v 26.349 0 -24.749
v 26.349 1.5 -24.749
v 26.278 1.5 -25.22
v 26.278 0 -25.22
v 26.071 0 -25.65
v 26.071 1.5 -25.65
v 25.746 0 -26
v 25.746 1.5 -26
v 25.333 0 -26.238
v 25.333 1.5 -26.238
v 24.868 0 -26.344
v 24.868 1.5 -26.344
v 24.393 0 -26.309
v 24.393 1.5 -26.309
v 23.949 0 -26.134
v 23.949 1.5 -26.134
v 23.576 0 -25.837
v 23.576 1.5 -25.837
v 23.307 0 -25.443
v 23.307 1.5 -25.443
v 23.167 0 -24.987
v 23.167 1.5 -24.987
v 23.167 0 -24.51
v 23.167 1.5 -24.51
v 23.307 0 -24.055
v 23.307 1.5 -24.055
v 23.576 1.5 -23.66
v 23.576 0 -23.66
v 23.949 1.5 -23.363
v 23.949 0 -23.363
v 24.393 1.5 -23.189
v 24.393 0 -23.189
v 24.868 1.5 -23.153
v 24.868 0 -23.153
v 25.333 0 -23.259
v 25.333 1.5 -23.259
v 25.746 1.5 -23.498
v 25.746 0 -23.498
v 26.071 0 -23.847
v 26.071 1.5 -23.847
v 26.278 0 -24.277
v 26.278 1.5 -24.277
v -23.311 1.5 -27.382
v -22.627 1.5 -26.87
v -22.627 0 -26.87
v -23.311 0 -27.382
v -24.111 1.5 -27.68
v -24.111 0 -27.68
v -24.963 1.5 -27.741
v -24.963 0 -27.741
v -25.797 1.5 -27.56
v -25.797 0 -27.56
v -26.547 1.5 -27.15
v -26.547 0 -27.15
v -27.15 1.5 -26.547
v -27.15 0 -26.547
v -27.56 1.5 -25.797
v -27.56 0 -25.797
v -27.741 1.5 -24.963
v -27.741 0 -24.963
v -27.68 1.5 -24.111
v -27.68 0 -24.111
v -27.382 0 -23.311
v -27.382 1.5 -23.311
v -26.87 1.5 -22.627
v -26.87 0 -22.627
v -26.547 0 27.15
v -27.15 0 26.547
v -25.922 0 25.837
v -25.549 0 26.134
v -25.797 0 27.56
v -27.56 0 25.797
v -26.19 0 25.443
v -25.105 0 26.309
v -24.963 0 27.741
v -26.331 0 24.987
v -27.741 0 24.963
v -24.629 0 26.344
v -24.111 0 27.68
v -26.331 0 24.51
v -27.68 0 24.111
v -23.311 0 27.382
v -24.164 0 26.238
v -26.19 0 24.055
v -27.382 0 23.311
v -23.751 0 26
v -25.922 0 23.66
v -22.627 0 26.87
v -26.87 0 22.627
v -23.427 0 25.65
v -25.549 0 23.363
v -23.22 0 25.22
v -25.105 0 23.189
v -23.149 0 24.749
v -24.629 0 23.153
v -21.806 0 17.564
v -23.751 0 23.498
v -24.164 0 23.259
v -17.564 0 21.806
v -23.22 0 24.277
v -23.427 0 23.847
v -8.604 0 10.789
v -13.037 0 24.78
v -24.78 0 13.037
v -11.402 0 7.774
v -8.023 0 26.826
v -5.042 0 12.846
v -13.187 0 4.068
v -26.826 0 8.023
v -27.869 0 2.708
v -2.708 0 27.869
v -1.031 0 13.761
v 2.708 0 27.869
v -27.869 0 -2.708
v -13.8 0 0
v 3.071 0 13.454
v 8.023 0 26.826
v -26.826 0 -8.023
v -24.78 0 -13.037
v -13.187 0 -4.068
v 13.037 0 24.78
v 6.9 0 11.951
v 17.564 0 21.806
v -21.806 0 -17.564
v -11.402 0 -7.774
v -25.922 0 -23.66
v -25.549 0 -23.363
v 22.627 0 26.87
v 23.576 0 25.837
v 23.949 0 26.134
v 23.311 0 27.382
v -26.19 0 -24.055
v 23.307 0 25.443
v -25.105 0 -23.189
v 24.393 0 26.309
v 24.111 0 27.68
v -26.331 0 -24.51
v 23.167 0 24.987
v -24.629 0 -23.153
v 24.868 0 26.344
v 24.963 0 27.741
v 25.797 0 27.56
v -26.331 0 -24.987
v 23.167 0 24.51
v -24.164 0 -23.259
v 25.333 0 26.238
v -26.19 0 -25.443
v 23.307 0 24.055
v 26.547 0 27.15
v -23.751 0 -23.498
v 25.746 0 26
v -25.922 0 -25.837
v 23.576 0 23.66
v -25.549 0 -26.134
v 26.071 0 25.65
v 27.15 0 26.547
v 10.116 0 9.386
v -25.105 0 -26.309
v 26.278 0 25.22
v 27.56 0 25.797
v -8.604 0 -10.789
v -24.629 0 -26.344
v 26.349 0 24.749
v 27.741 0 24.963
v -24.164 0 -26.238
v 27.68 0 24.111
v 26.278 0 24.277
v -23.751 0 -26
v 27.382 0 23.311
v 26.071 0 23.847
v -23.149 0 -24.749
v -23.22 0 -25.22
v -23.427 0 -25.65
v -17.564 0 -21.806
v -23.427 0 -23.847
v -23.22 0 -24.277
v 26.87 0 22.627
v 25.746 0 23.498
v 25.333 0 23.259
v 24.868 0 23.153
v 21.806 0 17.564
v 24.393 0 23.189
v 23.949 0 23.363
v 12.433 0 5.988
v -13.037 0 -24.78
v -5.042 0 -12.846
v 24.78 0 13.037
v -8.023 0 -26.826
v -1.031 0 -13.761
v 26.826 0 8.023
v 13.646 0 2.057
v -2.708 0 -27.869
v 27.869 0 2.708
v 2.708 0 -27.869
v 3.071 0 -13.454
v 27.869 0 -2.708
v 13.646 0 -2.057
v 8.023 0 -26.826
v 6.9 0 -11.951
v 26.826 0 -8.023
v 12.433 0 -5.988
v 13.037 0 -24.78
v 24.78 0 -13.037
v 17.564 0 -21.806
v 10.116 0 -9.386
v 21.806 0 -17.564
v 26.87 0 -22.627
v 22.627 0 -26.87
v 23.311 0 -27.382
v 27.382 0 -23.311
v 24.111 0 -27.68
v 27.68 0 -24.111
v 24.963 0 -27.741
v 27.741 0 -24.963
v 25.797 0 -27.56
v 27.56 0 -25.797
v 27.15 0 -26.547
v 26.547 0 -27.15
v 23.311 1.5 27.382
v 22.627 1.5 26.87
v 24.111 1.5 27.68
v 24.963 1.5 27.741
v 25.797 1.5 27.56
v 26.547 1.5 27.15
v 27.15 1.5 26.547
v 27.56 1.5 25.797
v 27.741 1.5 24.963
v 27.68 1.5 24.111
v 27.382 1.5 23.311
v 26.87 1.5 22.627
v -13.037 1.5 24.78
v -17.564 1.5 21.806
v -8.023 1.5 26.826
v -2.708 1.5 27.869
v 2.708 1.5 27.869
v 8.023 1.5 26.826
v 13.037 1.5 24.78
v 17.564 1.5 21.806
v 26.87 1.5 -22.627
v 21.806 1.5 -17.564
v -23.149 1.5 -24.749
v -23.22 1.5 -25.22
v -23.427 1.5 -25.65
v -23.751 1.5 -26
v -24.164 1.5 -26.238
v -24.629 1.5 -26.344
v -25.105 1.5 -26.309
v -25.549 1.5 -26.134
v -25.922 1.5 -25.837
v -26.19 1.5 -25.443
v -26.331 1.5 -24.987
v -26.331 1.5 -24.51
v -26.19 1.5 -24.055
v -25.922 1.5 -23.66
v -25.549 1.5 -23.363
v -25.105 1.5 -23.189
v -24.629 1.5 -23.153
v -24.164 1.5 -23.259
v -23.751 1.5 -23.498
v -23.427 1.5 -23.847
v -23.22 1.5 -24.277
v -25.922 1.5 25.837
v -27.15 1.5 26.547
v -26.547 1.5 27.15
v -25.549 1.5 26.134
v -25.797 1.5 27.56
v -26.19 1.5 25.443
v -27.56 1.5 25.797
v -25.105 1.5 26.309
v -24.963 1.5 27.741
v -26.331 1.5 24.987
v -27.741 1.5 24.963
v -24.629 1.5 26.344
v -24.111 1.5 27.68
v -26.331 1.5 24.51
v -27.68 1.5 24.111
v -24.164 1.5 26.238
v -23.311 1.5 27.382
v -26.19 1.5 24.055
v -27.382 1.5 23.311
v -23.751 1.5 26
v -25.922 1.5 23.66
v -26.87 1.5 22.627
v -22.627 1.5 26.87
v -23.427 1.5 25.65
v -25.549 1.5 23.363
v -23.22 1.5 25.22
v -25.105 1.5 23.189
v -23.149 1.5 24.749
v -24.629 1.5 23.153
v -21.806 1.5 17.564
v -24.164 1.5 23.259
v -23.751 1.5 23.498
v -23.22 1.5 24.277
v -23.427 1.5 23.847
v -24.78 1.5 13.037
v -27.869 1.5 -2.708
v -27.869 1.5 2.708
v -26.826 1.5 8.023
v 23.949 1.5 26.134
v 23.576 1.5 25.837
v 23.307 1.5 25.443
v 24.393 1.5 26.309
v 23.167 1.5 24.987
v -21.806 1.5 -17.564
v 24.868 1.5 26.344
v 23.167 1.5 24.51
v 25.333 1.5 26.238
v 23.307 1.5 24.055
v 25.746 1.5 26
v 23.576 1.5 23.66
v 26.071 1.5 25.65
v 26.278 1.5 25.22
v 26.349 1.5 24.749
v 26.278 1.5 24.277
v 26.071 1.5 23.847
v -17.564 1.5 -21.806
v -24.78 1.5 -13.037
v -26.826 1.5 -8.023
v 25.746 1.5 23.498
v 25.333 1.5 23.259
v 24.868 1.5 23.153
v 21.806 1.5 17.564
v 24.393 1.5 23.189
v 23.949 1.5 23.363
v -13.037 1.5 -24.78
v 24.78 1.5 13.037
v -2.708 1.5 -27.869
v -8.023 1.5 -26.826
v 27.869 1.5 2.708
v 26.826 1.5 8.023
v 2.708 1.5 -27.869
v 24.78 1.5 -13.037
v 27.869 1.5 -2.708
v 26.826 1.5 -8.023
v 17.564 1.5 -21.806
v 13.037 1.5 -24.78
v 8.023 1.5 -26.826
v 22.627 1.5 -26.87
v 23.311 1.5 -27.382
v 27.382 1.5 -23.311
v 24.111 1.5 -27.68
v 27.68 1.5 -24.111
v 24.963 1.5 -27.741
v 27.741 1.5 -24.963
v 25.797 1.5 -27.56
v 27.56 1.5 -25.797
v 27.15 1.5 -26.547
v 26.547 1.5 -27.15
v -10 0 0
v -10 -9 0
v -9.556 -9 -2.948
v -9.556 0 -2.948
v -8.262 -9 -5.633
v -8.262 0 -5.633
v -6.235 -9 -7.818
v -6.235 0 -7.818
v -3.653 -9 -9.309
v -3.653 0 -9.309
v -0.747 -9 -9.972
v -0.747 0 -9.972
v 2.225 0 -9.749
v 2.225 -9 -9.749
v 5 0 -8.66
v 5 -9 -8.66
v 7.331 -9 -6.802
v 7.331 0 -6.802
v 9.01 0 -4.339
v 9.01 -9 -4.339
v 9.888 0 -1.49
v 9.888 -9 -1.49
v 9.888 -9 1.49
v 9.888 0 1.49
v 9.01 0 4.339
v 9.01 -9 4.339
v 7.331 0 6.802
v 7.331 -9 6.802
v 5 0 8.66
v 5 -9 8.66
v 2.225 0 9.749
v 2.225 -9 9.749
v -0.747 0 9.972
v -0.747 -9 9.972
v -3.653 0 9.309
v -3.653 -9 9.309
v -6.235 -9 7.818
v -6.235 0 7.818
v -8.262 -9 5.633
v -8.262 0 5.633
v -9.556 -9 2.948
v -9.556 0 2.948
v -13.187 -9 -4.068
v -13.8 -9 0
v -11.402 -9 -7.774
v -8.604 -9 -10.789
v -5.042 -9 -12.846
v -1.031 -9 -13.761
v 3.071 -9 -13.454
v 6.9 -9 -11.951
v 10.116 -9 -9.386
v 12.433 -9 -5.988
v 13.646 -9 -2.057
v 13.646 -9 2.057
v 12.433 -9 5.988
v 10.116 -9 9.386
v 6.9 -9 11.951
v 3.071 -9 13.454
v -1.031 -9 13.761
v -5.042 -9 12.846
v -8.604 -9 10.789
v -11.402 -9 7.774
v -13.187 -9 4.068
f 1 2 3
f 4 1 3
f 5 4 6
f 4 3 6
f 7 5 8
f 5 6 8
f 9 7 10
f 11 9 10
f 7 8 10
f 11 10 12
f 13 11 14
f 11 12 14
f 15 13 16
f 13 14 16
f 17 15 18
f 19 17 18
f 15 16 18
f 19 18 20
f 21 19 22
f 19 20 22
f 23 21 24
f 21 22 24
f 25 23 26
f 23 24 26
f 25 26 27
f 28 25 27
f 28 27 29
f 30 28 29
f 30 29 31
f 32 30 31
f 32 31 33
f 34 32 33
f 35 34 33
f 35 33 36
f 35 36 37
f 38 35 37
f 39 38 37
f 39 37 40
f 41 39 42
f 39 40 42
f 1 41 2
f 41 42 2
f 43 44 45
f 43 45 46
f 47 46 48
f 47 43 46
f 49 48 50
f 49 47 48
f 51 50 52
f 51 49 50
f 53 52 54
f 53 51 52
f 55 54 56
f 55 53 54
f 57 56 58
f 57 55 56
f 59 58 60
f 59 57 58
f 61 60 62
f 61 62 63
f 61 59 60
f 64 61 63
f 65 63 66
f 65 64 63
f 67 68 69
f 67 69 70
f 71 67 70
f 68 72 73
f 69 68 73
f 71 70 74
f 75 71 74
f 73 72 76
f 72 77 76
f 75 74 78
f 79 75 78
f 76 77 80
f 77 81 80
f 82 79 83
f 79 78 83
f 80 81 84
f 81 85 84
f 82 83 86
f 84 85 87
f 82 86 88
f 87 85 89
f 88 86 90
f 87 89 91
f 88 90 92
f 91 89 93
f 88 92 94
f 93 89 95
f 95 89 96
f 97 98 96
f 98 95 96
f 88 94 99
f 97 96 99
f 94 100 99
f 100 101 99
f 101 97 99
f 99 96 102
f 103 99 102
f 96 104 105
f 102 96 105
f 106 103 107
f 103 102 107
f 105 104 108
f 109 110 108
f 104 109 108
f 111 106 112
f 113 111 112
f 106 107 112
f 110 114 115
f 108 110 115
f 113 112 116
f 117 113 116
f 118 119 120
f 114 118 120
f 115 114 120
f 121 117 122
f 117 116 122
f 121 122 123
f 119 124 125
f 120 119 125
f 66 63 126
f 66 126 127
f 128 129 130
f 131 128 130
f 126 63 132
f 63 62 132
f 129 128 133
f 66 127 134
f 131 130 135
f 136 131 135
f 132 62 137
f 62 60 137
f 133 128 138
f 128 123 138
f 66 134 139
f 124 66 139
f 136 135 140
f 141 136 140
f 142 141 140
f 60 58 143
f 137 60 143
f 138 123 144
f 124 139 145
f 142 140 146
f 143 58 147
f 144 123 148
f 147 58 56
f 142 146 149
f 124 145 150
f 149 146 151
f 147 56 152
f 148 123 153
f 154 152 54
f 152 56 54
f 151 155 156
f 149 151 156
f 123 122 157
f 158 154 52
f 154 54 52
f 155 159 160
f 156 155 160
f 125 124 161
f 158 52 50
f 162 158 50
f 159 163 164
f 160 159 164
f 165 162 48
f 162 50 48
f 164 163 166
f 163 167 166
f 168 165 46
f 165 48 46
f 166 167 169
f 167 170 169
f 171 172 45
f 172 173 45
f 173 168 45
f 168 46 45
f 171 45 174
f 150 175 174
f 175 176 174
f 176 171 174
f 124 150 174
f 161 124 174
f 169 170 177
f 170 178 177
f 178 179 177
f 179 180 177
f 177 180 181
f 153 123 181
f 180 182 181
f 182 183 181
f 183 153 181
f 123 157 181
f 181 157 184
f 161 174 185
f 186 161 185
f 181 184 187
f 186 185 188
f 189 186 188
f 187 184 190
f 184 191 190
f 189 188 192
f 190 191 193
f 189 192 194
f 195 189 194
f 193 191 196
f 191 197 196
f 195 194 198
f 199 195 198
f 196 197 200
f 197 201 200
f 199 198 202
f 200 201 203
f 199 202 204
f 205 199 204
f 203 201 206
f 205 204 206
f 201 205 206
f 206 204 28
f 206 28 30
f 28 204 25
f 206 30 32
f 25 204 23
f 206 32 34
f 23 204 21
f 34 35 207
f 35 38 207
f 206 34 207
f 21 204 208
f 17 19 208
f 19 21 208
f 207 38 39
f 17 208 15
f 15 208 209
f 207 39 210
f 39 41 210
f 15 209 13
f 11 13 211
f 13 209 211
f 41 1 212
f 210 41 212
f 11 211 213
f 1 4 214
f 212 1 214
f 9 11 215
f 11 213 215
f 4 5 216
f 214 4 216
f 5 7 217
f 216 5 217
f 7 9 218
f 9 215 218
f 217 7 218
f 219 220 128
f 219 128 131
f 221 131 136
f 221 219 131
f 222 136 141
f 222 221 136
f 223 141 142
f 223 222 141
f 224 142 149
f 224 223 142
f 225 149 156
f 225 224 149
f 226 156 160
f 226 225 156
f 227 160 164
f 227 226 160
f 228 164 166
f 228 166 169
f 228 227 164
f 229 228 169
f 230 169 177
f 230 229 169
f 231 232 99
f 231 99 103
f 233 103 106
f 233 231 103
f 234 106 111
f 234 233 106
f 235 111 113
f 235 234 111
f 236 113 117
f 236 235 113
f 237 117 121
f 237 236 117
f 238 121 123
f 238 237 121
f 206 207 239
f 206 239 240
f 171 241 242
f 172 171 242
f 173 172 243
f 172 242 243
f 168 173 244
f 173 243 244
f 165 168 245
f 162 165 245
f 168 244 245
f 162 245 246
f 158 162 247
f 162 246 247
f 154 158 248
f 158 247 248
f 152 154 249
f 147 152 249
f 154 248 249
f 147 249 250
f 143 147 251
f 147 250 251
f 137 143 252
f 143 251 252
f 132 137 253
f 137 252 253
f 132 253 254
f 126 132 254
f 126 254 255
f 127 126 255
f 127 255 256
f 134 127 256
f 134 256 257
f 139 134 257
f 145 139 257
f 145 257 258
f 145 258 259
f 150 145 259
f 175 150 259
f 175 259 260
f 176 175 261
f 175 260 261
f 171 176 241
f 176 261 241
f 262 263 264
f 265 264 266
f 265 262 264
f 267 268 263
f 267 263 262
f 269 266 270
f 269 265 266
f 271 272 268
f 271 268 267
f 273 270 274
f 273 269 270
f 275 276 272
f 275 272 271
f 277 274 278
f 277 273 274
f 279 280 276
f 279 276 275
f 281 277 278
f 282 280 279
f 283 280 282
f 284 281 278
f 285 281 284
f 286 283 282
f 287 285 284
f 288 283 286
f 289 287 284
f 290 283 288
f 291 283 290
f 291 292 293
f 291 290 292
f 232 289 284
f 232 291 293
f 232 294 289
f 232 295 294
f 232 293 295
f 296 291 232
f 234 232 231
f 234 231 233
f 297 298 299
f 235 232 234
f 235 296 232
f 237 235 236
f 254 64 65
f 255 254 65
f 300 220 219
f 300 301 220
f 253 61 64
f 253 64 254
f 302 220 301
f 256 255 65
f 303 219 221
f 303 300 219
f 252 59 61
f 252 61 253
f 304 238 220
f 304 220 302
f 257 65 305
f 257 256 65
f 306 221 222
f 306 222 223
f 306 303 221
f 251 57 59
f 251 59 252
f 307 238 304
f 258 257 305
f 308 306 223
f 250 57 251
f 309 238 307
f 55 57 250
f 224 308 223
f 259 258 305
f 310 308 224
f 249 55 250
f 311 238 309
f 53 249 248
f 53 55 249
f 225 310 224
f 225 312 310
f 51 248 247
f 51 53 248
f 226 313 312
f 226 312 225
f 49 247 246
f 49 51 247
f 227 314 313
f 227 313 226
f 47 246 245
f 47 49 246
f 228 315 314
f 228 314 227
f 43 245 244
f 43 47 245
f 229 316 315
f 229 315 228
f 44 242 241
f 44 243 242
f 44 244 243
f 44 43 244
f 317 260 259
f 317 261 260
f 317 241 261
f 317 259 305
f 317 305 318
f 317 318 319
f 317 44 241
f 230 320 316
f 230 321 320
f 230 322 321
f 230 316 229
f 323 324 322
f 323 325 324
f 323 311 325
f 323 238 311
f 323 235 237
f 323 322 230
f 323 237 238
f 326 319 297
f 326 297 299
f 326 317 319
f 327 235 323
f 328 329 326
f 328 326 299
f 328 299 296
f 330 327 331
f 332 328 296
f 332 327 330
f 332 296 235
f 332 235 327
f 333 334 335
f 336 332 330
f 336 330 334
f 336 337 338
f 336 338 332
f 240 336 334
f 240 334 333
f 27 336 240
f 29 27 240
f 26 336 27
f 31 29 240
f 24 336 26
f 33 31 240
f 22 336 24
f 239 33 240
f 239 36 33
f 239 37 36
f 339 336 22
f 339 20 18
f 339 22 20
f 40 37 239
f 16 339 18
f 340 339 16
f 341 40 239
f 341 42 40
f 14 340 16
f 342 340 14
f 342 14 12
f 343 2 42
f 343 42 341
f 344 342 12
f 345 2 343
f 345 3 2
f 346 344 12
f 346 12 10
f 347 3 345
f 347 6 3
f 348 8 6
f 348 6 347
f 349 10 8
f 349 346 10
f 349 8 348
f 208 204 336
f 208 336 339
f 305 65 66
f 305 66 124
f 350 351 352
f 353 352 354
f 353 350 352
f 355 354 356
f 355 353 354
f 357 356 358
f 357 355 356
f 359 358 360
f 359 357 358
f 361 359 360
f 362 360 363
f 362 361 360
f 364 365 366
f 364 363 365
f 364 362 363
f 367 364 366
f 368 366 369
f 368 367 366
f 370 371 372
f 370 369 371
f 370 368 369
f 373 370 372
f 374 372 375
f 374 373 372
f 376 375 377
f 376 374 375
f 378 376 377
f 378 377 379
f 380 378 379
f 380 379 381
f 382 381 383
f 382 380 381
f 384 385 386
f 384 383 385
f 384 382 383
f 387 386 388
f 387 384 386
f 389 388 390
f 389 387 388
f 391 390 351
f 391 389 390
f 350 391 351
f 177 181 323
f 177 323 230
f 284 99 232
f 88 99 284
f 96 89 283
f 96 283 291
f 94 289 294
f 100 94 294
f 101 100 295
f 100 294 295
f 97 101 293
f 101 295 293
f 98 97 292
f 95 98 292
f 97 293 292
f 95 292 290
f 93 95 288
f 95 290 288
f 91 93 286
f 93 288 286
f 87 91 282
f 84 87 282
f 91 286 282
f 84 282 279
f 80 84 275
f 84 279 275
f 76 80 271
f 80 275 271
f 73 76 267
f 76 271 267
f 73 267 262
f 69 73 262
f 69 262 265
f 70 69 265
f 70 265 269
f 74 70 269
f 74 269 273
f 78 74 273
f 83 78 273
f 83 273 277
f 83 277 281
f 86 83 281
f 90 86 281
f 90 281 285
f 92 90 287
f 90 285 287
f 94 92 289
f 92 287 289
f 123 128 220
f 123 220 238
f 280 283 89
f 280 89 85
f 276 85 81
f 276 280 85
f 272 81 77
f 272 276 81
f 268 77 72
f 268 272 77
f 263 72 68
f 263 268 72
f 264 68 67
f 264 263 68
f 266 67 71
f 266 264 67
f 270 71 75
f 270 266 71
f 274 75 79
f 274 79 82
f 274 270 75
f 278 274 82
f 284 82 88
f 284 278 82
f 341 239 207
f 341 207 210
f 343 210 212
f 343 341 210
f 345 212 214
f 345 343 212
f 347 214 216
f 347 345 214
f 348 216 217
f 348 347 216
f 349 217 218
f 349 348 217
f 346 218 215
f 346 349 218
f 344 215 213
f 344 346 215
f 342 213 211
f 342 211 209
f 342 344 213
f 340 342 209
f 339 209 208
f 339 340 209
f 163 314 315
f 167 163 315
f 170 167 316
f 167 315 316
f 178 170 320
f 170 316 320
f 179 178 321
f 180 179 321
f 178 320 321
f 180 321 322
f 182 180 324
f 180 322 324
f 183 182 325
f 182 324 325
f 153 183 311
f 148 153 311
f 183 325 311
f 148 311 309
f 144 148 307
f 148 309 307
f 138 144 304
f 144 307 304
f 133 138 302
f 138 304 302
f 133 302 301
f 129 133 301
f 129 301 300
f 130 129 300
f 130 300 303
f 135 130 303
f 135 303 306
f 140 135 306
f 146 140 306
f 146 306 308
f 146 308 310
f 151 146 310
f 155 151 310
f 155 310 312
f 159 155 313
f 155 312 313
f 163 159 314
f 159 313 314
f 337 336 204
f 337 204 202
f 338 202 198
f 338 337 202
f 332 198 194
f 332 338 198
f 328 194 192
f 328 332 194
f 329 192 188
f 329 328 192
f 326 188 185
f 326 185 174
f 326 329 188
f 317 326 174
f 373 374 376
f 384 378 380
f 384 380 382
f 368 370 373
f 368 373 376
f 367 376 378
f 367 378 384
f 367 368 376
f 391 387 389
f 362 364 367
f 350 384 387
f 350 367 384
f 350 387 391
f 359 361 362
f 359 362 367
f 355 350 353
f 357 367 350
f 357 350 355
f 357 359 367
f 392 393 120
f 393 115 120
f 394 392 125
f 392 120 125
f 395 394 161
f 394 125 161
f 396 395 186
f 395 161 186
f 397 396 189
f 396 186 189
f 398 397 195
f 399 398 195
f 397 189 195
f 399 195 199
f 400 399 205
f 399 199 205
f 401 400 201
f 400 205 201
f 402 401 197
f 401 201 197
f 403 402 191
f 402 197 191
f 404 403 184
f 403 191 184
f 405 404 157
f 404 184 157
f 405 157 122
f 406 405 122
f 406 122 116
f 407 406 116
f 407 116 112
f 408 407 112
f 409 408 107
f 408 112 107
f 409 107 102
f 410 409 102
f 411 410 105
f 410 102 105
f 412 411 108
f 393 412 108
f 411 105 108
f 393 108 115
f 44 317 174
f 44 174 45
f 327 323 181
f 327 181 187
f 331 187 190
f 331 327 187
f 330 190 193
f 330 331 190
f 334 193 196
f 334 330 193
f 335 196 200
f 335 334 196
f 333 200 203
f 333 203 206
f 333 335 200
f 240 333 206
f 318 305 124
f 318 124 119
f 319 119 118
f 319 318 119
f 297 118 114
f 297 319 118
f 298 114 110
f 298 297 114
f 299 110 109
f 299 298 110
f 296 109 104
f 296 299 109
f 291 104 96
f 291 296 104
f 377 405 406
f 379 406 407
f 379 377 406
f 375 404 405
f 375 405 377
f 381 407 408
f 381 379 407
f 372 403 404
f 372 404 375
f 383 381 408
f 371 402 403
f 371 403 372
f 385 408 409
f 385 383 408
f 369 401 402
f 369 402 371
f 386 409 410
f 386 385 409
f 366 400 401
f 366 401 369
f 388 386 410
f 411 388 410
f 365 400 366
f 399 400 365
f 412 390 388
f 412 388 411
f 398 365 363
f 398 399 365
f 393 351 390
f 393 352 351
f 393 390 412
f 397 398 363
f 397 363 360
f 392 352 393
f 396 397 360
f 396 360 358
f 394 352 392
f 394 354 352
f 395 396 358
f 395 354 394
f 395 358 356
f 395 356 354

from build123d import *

# Parameters (mm, degrees)
SKETCH1_R                = 1.6
BOSS_EXTRUDE1_DEPTH      = 1.5
FILLET1_R                = 2
SKETCH2_R                = 4
BOSS_EXTRUDE2_DEPTH      = 5
SKETCH5_R                = 13.8
BOSS_EXTRUDE4_DEPTH      = 3
BOSS_EXTRUDE4_DEPTH_BACK = 5
SKETCH6_R                = 10
CUT_EXTRUDE2_DEPTH       = 8
SKETCH3_R                = 1.6
BOSS_EXTRUDE5_DEPTH      = 1.5
SKETCH7_R                = 13.8
SKETCH7_R_2              = 10
BOSS_EXTRUDE6_DEPTH      = 5
SKETCH8_R                = 13.8
CUT_EXTRUDE3_DEPTH       = 3
SKETCH9_R                = 13.8
CUT_EXTRUDE4_DEPTH       = 1
SKETCH10_R               = 28
BOSS_EXTRUDE7_DEPTH      = 1.5


with BuildPart() as part:
    # Sketch1 → Boss-Extrude1 (new body)
    with BuildSketch(Plane(origin=(0, 0, 0), x_dir=(1, 0, 0), z_dir=(0, 1, 0))):
        with BuildLine():
            Line((-23.334523779, -19.091883092), (-20.383302711, -16.140662024))
            ThreePointArc((-20.383302711, -16.140662024), (-26, 0), (-20.383302711, 16.140662024))
            Line((-20.383302711, 16.140662024), (-23.334523779, 19.091883092))
            ThreePointArc((-23.334523779, 19.091883092), (-23.334523779, 23.334523779), (-19.091883092, 23.334523779))
            Line((-19.091883092, 23.334523779), (-16.140662024, 20.383302711))
            ThreePointArc((-16.140662024, 20.383302711), (0, 26), (16.140662024, 20.383302711))
            Line((16.140662024, 20.383302711), (19.091883092, 23.334523779))
            ThreePointArc((19.091883092, 23.334523779), (23.334523779, 23.334523779), (23.334523779, 19.091883092))
            Line((23.334523779, 19.091883092), (20.383302711, 16.140662024))
            ThreePointArc((20.383302711, 16.140662024), (26, 0), (20.383302711, -16.140662024))
            Line((20.383302711, -16.140662024), (23.334523779, -19.091883092))
            ThreePointArc((23.334523779, -19.091883092), (23.334523779, -23.334523779), (19.091883092, -23.334523779))
            Line((19.091883092, -23.334523779), (16.140662024, -20.383302711))
            ThreePointArc((16.140662024, -20.383302711), (0, -26), (-16.140662024, -20.383302711))
            Line((-16.140662024, -20.383302711), (-19.091883092, -23.334523779))
            ThreePointArc((-19.091883092, -23.334523779), (-23.334523779, -23.334523779), (-23.334523779, -19.091883092))
        make_face()
        with Locations((-21.213203436, 21.213203436)):
            Circle(SKETCH1_R, mode=Mode.SUBTRACT)
        with Locations((21.213203436, 21.213203436)):
            Circle(SKETCH1_R, mode=Mode.SUBTRACT)
        with Locations((-21.213203436, -21.213203436)):
            Circle(SKETCH1_R, mode=Mode.SUBTRACT)
        with Locations((21.213203436, -21.213203436)):
            Circle(SKETCH1_R, mode=Mode.SUBTRACT)
    extrude(amount=BOSS_EXTRUDE1_DEPTH)

    # Fillet1
    fillet1_edges = [part.edges().sort_by_distance(p)[0] for p in [
        (-20.383302711, 0.75, -16.140662024),
        (-16.140662024, 0.75, -20.383302711),
        (16.140662024, 0.75, -20.383302711),
        (20.383302711, 0.75, -16.140662024),
        (20.383302711, 0.75, 16.140662024),
        (16.140662024, 0.75, 20.383302711),
        (-16.140662024, 0.75, 20.383302711),
    ]]
    fillet(fillet1_edges, radius=FILLET1_R)

    # Sketch2 → Boss-Extrude2 (add)
    with BuildSketch(Plane(origin=(0, 0, 0), x_dir=(-1, 0, 0), z_dir=(0, -1, 0))):
        Circle(SKETCH2_R)
    extrude(amount=BOSS_EXTRUDE2_DEPTH)

    # Sketch5 → Boss-Extrude4 (add, two sides)
    with BuildSketch(Plane(origin=(0, -5, 0), x_dir=(-1, 0, 0), z_dir=(0, -1, 0))) as boss_extrude4_sk:
        Circle(SKETCH5_R)
    extrude(amount=BOSS_EXTRUDE4_DEPTH)
    extrude(boss_extrude4_sk.sketch, amount=-BOSS_EXTRUDE4_DEPTH_BACK)

    # Sketch6 → Cut-Extrude2 (cut)
    with BuildSketch(Plane(origin=(0, -8, 0), x_dir=(-1, 0, 0), z_dir=(0, -1, 0))):
        Circle(SKETCH6_R)
    extrude(amount=-CUT_EXTRUDE2_DEPTH, mode=Mode.SUBTRACT)

    # Sketch3 → Boss-Extrude5 (add)
    with BuildSketch(Plane(origin=(0, 1.5, 0), x_dir=(1, 0, 0), z_dir=(0, 1, 0))):
        with BuildLine():
            Line((-26.870057685, 22.627416998), (-19.914697313, 15.672056626))
            Line((-19.914697313, 15.672056626), (-15.672056626, 19.914697313))
            Line((-15.672056626, 19.914697313), (-22.627416998, 26.870057685))
            ThreePointArc((-22.627416998, 26.870057685), (-26.870057685, 26.870057685), (-26.870057685, 22.627416998))
        make_face()
        with Locations((-24.748737342, 24.748737342)):
            Circle(SKETCH3_R, mode=Mode.SUBTRACT)
        with BuildLine():
            Line((15.672056626, 19.914697313), (19.914697313, 15.672056626))
            Line((19.914697313, 15.672056626), (26.870057685, 22.627416998))
            ThreePointArc((26.870057685, 22.627416998), (26.870057685, 26.870057685), (22.627416998, 26.870057685))
            Line((22.627416998, 26.870057685), (15.672056626, 19.914697313))
        make_face()
        with Locations((24.748737342, 24.748737342)):
            Circle(SKETCH3_R, mode=Mode.SUBTRACT)
        with BuildLine():
            Line((26.870057685, -22.627416998), (19.914697313, -15.672056626))
            Line((19.914697313, -15.672056626), (15.672056626, -19.914697313))
            Line((15.672056626, -19.914697313), (22.627416998, -26.870057685))
            ThreePointArc((22.627416998, -26.870057685), (26.870057685, -26.870057685), (26.870057685, -22.627416998))
        make_face()
        with Locations((24.748737342, -24.748737342)):
            Circle(SKETCH3_R, mode=Mode.SUBTRACT)
        with BuildLine():
            Line((-15.672056626, -19.914697313), (-19.914697313, -15.672056626))
            Line((-19.914697313, -15.672056626), (-26.870057685, -22.627416998))
            ThreePointArc((-26.870057685, -22.627416998), (-26.870057685, -26.870057685), (-22.627416998, -26.870057685))
            Line((-22.627416998, -26.870057685), (-15.672056626, -19.914697313))
        make_face()
        with Locations((-24.748737342, -24.748737342)):
            Circle(SKETCH3_R, mode=Mode.SUBTRACT)
    extrude(amount=-BOSS_EXTRUDE5_DEPTH)

    # Sketch7 → Boss-Extrude6 (add)
    with BuildSketch(Plane(origin=(0, -8, 0), x_dir=(-1, 0, 0), z_dir=(0, -1, 0))):
        Circle(SKETCH7_R)
        Circle(SKETCH7_R_2, mode=Mode.SUBTRACT)
    extrude(amount=BOSS_EXTRUDE6_DEPTH)

    # Sketch8 → Cut-Extrude3 (cut)
    with BuildSketch(Plane(origin=(0, -13, 0), x_dir=(-1, 0, 0), z_dir=(0, -1, 0))):
        Circle(SKETCH8_R)
    extrude(amount=-CUT_EXTRUDE3_DEPTH, mode=Mode.SUBTRACT)

    # Sketch9 → Cut-Extrude4 (cut)
    with BuildSketch(Plane(origin=(0, -10, 0), x_dir=(-1, 0, 0), z_dir=(0, -1, 0))):
        Circle(SKETCH9_R)
    extrude(amount=-CUT_EXTRUDE4_DEPTH, mode=Mode.SUBTRACT)

    # Sketch10 → Boss-Extrude7 (add)
    with BuildSketch(Plane(origin=(0, 1.5, 0), x_dir=(1, 0, 0), z_dir=(0, 1, 0))):
        Circle(SKETCH10_R)
    extrude(amount=-BOSS_EXTRUDE7_DEPTH)


solid = part.part
